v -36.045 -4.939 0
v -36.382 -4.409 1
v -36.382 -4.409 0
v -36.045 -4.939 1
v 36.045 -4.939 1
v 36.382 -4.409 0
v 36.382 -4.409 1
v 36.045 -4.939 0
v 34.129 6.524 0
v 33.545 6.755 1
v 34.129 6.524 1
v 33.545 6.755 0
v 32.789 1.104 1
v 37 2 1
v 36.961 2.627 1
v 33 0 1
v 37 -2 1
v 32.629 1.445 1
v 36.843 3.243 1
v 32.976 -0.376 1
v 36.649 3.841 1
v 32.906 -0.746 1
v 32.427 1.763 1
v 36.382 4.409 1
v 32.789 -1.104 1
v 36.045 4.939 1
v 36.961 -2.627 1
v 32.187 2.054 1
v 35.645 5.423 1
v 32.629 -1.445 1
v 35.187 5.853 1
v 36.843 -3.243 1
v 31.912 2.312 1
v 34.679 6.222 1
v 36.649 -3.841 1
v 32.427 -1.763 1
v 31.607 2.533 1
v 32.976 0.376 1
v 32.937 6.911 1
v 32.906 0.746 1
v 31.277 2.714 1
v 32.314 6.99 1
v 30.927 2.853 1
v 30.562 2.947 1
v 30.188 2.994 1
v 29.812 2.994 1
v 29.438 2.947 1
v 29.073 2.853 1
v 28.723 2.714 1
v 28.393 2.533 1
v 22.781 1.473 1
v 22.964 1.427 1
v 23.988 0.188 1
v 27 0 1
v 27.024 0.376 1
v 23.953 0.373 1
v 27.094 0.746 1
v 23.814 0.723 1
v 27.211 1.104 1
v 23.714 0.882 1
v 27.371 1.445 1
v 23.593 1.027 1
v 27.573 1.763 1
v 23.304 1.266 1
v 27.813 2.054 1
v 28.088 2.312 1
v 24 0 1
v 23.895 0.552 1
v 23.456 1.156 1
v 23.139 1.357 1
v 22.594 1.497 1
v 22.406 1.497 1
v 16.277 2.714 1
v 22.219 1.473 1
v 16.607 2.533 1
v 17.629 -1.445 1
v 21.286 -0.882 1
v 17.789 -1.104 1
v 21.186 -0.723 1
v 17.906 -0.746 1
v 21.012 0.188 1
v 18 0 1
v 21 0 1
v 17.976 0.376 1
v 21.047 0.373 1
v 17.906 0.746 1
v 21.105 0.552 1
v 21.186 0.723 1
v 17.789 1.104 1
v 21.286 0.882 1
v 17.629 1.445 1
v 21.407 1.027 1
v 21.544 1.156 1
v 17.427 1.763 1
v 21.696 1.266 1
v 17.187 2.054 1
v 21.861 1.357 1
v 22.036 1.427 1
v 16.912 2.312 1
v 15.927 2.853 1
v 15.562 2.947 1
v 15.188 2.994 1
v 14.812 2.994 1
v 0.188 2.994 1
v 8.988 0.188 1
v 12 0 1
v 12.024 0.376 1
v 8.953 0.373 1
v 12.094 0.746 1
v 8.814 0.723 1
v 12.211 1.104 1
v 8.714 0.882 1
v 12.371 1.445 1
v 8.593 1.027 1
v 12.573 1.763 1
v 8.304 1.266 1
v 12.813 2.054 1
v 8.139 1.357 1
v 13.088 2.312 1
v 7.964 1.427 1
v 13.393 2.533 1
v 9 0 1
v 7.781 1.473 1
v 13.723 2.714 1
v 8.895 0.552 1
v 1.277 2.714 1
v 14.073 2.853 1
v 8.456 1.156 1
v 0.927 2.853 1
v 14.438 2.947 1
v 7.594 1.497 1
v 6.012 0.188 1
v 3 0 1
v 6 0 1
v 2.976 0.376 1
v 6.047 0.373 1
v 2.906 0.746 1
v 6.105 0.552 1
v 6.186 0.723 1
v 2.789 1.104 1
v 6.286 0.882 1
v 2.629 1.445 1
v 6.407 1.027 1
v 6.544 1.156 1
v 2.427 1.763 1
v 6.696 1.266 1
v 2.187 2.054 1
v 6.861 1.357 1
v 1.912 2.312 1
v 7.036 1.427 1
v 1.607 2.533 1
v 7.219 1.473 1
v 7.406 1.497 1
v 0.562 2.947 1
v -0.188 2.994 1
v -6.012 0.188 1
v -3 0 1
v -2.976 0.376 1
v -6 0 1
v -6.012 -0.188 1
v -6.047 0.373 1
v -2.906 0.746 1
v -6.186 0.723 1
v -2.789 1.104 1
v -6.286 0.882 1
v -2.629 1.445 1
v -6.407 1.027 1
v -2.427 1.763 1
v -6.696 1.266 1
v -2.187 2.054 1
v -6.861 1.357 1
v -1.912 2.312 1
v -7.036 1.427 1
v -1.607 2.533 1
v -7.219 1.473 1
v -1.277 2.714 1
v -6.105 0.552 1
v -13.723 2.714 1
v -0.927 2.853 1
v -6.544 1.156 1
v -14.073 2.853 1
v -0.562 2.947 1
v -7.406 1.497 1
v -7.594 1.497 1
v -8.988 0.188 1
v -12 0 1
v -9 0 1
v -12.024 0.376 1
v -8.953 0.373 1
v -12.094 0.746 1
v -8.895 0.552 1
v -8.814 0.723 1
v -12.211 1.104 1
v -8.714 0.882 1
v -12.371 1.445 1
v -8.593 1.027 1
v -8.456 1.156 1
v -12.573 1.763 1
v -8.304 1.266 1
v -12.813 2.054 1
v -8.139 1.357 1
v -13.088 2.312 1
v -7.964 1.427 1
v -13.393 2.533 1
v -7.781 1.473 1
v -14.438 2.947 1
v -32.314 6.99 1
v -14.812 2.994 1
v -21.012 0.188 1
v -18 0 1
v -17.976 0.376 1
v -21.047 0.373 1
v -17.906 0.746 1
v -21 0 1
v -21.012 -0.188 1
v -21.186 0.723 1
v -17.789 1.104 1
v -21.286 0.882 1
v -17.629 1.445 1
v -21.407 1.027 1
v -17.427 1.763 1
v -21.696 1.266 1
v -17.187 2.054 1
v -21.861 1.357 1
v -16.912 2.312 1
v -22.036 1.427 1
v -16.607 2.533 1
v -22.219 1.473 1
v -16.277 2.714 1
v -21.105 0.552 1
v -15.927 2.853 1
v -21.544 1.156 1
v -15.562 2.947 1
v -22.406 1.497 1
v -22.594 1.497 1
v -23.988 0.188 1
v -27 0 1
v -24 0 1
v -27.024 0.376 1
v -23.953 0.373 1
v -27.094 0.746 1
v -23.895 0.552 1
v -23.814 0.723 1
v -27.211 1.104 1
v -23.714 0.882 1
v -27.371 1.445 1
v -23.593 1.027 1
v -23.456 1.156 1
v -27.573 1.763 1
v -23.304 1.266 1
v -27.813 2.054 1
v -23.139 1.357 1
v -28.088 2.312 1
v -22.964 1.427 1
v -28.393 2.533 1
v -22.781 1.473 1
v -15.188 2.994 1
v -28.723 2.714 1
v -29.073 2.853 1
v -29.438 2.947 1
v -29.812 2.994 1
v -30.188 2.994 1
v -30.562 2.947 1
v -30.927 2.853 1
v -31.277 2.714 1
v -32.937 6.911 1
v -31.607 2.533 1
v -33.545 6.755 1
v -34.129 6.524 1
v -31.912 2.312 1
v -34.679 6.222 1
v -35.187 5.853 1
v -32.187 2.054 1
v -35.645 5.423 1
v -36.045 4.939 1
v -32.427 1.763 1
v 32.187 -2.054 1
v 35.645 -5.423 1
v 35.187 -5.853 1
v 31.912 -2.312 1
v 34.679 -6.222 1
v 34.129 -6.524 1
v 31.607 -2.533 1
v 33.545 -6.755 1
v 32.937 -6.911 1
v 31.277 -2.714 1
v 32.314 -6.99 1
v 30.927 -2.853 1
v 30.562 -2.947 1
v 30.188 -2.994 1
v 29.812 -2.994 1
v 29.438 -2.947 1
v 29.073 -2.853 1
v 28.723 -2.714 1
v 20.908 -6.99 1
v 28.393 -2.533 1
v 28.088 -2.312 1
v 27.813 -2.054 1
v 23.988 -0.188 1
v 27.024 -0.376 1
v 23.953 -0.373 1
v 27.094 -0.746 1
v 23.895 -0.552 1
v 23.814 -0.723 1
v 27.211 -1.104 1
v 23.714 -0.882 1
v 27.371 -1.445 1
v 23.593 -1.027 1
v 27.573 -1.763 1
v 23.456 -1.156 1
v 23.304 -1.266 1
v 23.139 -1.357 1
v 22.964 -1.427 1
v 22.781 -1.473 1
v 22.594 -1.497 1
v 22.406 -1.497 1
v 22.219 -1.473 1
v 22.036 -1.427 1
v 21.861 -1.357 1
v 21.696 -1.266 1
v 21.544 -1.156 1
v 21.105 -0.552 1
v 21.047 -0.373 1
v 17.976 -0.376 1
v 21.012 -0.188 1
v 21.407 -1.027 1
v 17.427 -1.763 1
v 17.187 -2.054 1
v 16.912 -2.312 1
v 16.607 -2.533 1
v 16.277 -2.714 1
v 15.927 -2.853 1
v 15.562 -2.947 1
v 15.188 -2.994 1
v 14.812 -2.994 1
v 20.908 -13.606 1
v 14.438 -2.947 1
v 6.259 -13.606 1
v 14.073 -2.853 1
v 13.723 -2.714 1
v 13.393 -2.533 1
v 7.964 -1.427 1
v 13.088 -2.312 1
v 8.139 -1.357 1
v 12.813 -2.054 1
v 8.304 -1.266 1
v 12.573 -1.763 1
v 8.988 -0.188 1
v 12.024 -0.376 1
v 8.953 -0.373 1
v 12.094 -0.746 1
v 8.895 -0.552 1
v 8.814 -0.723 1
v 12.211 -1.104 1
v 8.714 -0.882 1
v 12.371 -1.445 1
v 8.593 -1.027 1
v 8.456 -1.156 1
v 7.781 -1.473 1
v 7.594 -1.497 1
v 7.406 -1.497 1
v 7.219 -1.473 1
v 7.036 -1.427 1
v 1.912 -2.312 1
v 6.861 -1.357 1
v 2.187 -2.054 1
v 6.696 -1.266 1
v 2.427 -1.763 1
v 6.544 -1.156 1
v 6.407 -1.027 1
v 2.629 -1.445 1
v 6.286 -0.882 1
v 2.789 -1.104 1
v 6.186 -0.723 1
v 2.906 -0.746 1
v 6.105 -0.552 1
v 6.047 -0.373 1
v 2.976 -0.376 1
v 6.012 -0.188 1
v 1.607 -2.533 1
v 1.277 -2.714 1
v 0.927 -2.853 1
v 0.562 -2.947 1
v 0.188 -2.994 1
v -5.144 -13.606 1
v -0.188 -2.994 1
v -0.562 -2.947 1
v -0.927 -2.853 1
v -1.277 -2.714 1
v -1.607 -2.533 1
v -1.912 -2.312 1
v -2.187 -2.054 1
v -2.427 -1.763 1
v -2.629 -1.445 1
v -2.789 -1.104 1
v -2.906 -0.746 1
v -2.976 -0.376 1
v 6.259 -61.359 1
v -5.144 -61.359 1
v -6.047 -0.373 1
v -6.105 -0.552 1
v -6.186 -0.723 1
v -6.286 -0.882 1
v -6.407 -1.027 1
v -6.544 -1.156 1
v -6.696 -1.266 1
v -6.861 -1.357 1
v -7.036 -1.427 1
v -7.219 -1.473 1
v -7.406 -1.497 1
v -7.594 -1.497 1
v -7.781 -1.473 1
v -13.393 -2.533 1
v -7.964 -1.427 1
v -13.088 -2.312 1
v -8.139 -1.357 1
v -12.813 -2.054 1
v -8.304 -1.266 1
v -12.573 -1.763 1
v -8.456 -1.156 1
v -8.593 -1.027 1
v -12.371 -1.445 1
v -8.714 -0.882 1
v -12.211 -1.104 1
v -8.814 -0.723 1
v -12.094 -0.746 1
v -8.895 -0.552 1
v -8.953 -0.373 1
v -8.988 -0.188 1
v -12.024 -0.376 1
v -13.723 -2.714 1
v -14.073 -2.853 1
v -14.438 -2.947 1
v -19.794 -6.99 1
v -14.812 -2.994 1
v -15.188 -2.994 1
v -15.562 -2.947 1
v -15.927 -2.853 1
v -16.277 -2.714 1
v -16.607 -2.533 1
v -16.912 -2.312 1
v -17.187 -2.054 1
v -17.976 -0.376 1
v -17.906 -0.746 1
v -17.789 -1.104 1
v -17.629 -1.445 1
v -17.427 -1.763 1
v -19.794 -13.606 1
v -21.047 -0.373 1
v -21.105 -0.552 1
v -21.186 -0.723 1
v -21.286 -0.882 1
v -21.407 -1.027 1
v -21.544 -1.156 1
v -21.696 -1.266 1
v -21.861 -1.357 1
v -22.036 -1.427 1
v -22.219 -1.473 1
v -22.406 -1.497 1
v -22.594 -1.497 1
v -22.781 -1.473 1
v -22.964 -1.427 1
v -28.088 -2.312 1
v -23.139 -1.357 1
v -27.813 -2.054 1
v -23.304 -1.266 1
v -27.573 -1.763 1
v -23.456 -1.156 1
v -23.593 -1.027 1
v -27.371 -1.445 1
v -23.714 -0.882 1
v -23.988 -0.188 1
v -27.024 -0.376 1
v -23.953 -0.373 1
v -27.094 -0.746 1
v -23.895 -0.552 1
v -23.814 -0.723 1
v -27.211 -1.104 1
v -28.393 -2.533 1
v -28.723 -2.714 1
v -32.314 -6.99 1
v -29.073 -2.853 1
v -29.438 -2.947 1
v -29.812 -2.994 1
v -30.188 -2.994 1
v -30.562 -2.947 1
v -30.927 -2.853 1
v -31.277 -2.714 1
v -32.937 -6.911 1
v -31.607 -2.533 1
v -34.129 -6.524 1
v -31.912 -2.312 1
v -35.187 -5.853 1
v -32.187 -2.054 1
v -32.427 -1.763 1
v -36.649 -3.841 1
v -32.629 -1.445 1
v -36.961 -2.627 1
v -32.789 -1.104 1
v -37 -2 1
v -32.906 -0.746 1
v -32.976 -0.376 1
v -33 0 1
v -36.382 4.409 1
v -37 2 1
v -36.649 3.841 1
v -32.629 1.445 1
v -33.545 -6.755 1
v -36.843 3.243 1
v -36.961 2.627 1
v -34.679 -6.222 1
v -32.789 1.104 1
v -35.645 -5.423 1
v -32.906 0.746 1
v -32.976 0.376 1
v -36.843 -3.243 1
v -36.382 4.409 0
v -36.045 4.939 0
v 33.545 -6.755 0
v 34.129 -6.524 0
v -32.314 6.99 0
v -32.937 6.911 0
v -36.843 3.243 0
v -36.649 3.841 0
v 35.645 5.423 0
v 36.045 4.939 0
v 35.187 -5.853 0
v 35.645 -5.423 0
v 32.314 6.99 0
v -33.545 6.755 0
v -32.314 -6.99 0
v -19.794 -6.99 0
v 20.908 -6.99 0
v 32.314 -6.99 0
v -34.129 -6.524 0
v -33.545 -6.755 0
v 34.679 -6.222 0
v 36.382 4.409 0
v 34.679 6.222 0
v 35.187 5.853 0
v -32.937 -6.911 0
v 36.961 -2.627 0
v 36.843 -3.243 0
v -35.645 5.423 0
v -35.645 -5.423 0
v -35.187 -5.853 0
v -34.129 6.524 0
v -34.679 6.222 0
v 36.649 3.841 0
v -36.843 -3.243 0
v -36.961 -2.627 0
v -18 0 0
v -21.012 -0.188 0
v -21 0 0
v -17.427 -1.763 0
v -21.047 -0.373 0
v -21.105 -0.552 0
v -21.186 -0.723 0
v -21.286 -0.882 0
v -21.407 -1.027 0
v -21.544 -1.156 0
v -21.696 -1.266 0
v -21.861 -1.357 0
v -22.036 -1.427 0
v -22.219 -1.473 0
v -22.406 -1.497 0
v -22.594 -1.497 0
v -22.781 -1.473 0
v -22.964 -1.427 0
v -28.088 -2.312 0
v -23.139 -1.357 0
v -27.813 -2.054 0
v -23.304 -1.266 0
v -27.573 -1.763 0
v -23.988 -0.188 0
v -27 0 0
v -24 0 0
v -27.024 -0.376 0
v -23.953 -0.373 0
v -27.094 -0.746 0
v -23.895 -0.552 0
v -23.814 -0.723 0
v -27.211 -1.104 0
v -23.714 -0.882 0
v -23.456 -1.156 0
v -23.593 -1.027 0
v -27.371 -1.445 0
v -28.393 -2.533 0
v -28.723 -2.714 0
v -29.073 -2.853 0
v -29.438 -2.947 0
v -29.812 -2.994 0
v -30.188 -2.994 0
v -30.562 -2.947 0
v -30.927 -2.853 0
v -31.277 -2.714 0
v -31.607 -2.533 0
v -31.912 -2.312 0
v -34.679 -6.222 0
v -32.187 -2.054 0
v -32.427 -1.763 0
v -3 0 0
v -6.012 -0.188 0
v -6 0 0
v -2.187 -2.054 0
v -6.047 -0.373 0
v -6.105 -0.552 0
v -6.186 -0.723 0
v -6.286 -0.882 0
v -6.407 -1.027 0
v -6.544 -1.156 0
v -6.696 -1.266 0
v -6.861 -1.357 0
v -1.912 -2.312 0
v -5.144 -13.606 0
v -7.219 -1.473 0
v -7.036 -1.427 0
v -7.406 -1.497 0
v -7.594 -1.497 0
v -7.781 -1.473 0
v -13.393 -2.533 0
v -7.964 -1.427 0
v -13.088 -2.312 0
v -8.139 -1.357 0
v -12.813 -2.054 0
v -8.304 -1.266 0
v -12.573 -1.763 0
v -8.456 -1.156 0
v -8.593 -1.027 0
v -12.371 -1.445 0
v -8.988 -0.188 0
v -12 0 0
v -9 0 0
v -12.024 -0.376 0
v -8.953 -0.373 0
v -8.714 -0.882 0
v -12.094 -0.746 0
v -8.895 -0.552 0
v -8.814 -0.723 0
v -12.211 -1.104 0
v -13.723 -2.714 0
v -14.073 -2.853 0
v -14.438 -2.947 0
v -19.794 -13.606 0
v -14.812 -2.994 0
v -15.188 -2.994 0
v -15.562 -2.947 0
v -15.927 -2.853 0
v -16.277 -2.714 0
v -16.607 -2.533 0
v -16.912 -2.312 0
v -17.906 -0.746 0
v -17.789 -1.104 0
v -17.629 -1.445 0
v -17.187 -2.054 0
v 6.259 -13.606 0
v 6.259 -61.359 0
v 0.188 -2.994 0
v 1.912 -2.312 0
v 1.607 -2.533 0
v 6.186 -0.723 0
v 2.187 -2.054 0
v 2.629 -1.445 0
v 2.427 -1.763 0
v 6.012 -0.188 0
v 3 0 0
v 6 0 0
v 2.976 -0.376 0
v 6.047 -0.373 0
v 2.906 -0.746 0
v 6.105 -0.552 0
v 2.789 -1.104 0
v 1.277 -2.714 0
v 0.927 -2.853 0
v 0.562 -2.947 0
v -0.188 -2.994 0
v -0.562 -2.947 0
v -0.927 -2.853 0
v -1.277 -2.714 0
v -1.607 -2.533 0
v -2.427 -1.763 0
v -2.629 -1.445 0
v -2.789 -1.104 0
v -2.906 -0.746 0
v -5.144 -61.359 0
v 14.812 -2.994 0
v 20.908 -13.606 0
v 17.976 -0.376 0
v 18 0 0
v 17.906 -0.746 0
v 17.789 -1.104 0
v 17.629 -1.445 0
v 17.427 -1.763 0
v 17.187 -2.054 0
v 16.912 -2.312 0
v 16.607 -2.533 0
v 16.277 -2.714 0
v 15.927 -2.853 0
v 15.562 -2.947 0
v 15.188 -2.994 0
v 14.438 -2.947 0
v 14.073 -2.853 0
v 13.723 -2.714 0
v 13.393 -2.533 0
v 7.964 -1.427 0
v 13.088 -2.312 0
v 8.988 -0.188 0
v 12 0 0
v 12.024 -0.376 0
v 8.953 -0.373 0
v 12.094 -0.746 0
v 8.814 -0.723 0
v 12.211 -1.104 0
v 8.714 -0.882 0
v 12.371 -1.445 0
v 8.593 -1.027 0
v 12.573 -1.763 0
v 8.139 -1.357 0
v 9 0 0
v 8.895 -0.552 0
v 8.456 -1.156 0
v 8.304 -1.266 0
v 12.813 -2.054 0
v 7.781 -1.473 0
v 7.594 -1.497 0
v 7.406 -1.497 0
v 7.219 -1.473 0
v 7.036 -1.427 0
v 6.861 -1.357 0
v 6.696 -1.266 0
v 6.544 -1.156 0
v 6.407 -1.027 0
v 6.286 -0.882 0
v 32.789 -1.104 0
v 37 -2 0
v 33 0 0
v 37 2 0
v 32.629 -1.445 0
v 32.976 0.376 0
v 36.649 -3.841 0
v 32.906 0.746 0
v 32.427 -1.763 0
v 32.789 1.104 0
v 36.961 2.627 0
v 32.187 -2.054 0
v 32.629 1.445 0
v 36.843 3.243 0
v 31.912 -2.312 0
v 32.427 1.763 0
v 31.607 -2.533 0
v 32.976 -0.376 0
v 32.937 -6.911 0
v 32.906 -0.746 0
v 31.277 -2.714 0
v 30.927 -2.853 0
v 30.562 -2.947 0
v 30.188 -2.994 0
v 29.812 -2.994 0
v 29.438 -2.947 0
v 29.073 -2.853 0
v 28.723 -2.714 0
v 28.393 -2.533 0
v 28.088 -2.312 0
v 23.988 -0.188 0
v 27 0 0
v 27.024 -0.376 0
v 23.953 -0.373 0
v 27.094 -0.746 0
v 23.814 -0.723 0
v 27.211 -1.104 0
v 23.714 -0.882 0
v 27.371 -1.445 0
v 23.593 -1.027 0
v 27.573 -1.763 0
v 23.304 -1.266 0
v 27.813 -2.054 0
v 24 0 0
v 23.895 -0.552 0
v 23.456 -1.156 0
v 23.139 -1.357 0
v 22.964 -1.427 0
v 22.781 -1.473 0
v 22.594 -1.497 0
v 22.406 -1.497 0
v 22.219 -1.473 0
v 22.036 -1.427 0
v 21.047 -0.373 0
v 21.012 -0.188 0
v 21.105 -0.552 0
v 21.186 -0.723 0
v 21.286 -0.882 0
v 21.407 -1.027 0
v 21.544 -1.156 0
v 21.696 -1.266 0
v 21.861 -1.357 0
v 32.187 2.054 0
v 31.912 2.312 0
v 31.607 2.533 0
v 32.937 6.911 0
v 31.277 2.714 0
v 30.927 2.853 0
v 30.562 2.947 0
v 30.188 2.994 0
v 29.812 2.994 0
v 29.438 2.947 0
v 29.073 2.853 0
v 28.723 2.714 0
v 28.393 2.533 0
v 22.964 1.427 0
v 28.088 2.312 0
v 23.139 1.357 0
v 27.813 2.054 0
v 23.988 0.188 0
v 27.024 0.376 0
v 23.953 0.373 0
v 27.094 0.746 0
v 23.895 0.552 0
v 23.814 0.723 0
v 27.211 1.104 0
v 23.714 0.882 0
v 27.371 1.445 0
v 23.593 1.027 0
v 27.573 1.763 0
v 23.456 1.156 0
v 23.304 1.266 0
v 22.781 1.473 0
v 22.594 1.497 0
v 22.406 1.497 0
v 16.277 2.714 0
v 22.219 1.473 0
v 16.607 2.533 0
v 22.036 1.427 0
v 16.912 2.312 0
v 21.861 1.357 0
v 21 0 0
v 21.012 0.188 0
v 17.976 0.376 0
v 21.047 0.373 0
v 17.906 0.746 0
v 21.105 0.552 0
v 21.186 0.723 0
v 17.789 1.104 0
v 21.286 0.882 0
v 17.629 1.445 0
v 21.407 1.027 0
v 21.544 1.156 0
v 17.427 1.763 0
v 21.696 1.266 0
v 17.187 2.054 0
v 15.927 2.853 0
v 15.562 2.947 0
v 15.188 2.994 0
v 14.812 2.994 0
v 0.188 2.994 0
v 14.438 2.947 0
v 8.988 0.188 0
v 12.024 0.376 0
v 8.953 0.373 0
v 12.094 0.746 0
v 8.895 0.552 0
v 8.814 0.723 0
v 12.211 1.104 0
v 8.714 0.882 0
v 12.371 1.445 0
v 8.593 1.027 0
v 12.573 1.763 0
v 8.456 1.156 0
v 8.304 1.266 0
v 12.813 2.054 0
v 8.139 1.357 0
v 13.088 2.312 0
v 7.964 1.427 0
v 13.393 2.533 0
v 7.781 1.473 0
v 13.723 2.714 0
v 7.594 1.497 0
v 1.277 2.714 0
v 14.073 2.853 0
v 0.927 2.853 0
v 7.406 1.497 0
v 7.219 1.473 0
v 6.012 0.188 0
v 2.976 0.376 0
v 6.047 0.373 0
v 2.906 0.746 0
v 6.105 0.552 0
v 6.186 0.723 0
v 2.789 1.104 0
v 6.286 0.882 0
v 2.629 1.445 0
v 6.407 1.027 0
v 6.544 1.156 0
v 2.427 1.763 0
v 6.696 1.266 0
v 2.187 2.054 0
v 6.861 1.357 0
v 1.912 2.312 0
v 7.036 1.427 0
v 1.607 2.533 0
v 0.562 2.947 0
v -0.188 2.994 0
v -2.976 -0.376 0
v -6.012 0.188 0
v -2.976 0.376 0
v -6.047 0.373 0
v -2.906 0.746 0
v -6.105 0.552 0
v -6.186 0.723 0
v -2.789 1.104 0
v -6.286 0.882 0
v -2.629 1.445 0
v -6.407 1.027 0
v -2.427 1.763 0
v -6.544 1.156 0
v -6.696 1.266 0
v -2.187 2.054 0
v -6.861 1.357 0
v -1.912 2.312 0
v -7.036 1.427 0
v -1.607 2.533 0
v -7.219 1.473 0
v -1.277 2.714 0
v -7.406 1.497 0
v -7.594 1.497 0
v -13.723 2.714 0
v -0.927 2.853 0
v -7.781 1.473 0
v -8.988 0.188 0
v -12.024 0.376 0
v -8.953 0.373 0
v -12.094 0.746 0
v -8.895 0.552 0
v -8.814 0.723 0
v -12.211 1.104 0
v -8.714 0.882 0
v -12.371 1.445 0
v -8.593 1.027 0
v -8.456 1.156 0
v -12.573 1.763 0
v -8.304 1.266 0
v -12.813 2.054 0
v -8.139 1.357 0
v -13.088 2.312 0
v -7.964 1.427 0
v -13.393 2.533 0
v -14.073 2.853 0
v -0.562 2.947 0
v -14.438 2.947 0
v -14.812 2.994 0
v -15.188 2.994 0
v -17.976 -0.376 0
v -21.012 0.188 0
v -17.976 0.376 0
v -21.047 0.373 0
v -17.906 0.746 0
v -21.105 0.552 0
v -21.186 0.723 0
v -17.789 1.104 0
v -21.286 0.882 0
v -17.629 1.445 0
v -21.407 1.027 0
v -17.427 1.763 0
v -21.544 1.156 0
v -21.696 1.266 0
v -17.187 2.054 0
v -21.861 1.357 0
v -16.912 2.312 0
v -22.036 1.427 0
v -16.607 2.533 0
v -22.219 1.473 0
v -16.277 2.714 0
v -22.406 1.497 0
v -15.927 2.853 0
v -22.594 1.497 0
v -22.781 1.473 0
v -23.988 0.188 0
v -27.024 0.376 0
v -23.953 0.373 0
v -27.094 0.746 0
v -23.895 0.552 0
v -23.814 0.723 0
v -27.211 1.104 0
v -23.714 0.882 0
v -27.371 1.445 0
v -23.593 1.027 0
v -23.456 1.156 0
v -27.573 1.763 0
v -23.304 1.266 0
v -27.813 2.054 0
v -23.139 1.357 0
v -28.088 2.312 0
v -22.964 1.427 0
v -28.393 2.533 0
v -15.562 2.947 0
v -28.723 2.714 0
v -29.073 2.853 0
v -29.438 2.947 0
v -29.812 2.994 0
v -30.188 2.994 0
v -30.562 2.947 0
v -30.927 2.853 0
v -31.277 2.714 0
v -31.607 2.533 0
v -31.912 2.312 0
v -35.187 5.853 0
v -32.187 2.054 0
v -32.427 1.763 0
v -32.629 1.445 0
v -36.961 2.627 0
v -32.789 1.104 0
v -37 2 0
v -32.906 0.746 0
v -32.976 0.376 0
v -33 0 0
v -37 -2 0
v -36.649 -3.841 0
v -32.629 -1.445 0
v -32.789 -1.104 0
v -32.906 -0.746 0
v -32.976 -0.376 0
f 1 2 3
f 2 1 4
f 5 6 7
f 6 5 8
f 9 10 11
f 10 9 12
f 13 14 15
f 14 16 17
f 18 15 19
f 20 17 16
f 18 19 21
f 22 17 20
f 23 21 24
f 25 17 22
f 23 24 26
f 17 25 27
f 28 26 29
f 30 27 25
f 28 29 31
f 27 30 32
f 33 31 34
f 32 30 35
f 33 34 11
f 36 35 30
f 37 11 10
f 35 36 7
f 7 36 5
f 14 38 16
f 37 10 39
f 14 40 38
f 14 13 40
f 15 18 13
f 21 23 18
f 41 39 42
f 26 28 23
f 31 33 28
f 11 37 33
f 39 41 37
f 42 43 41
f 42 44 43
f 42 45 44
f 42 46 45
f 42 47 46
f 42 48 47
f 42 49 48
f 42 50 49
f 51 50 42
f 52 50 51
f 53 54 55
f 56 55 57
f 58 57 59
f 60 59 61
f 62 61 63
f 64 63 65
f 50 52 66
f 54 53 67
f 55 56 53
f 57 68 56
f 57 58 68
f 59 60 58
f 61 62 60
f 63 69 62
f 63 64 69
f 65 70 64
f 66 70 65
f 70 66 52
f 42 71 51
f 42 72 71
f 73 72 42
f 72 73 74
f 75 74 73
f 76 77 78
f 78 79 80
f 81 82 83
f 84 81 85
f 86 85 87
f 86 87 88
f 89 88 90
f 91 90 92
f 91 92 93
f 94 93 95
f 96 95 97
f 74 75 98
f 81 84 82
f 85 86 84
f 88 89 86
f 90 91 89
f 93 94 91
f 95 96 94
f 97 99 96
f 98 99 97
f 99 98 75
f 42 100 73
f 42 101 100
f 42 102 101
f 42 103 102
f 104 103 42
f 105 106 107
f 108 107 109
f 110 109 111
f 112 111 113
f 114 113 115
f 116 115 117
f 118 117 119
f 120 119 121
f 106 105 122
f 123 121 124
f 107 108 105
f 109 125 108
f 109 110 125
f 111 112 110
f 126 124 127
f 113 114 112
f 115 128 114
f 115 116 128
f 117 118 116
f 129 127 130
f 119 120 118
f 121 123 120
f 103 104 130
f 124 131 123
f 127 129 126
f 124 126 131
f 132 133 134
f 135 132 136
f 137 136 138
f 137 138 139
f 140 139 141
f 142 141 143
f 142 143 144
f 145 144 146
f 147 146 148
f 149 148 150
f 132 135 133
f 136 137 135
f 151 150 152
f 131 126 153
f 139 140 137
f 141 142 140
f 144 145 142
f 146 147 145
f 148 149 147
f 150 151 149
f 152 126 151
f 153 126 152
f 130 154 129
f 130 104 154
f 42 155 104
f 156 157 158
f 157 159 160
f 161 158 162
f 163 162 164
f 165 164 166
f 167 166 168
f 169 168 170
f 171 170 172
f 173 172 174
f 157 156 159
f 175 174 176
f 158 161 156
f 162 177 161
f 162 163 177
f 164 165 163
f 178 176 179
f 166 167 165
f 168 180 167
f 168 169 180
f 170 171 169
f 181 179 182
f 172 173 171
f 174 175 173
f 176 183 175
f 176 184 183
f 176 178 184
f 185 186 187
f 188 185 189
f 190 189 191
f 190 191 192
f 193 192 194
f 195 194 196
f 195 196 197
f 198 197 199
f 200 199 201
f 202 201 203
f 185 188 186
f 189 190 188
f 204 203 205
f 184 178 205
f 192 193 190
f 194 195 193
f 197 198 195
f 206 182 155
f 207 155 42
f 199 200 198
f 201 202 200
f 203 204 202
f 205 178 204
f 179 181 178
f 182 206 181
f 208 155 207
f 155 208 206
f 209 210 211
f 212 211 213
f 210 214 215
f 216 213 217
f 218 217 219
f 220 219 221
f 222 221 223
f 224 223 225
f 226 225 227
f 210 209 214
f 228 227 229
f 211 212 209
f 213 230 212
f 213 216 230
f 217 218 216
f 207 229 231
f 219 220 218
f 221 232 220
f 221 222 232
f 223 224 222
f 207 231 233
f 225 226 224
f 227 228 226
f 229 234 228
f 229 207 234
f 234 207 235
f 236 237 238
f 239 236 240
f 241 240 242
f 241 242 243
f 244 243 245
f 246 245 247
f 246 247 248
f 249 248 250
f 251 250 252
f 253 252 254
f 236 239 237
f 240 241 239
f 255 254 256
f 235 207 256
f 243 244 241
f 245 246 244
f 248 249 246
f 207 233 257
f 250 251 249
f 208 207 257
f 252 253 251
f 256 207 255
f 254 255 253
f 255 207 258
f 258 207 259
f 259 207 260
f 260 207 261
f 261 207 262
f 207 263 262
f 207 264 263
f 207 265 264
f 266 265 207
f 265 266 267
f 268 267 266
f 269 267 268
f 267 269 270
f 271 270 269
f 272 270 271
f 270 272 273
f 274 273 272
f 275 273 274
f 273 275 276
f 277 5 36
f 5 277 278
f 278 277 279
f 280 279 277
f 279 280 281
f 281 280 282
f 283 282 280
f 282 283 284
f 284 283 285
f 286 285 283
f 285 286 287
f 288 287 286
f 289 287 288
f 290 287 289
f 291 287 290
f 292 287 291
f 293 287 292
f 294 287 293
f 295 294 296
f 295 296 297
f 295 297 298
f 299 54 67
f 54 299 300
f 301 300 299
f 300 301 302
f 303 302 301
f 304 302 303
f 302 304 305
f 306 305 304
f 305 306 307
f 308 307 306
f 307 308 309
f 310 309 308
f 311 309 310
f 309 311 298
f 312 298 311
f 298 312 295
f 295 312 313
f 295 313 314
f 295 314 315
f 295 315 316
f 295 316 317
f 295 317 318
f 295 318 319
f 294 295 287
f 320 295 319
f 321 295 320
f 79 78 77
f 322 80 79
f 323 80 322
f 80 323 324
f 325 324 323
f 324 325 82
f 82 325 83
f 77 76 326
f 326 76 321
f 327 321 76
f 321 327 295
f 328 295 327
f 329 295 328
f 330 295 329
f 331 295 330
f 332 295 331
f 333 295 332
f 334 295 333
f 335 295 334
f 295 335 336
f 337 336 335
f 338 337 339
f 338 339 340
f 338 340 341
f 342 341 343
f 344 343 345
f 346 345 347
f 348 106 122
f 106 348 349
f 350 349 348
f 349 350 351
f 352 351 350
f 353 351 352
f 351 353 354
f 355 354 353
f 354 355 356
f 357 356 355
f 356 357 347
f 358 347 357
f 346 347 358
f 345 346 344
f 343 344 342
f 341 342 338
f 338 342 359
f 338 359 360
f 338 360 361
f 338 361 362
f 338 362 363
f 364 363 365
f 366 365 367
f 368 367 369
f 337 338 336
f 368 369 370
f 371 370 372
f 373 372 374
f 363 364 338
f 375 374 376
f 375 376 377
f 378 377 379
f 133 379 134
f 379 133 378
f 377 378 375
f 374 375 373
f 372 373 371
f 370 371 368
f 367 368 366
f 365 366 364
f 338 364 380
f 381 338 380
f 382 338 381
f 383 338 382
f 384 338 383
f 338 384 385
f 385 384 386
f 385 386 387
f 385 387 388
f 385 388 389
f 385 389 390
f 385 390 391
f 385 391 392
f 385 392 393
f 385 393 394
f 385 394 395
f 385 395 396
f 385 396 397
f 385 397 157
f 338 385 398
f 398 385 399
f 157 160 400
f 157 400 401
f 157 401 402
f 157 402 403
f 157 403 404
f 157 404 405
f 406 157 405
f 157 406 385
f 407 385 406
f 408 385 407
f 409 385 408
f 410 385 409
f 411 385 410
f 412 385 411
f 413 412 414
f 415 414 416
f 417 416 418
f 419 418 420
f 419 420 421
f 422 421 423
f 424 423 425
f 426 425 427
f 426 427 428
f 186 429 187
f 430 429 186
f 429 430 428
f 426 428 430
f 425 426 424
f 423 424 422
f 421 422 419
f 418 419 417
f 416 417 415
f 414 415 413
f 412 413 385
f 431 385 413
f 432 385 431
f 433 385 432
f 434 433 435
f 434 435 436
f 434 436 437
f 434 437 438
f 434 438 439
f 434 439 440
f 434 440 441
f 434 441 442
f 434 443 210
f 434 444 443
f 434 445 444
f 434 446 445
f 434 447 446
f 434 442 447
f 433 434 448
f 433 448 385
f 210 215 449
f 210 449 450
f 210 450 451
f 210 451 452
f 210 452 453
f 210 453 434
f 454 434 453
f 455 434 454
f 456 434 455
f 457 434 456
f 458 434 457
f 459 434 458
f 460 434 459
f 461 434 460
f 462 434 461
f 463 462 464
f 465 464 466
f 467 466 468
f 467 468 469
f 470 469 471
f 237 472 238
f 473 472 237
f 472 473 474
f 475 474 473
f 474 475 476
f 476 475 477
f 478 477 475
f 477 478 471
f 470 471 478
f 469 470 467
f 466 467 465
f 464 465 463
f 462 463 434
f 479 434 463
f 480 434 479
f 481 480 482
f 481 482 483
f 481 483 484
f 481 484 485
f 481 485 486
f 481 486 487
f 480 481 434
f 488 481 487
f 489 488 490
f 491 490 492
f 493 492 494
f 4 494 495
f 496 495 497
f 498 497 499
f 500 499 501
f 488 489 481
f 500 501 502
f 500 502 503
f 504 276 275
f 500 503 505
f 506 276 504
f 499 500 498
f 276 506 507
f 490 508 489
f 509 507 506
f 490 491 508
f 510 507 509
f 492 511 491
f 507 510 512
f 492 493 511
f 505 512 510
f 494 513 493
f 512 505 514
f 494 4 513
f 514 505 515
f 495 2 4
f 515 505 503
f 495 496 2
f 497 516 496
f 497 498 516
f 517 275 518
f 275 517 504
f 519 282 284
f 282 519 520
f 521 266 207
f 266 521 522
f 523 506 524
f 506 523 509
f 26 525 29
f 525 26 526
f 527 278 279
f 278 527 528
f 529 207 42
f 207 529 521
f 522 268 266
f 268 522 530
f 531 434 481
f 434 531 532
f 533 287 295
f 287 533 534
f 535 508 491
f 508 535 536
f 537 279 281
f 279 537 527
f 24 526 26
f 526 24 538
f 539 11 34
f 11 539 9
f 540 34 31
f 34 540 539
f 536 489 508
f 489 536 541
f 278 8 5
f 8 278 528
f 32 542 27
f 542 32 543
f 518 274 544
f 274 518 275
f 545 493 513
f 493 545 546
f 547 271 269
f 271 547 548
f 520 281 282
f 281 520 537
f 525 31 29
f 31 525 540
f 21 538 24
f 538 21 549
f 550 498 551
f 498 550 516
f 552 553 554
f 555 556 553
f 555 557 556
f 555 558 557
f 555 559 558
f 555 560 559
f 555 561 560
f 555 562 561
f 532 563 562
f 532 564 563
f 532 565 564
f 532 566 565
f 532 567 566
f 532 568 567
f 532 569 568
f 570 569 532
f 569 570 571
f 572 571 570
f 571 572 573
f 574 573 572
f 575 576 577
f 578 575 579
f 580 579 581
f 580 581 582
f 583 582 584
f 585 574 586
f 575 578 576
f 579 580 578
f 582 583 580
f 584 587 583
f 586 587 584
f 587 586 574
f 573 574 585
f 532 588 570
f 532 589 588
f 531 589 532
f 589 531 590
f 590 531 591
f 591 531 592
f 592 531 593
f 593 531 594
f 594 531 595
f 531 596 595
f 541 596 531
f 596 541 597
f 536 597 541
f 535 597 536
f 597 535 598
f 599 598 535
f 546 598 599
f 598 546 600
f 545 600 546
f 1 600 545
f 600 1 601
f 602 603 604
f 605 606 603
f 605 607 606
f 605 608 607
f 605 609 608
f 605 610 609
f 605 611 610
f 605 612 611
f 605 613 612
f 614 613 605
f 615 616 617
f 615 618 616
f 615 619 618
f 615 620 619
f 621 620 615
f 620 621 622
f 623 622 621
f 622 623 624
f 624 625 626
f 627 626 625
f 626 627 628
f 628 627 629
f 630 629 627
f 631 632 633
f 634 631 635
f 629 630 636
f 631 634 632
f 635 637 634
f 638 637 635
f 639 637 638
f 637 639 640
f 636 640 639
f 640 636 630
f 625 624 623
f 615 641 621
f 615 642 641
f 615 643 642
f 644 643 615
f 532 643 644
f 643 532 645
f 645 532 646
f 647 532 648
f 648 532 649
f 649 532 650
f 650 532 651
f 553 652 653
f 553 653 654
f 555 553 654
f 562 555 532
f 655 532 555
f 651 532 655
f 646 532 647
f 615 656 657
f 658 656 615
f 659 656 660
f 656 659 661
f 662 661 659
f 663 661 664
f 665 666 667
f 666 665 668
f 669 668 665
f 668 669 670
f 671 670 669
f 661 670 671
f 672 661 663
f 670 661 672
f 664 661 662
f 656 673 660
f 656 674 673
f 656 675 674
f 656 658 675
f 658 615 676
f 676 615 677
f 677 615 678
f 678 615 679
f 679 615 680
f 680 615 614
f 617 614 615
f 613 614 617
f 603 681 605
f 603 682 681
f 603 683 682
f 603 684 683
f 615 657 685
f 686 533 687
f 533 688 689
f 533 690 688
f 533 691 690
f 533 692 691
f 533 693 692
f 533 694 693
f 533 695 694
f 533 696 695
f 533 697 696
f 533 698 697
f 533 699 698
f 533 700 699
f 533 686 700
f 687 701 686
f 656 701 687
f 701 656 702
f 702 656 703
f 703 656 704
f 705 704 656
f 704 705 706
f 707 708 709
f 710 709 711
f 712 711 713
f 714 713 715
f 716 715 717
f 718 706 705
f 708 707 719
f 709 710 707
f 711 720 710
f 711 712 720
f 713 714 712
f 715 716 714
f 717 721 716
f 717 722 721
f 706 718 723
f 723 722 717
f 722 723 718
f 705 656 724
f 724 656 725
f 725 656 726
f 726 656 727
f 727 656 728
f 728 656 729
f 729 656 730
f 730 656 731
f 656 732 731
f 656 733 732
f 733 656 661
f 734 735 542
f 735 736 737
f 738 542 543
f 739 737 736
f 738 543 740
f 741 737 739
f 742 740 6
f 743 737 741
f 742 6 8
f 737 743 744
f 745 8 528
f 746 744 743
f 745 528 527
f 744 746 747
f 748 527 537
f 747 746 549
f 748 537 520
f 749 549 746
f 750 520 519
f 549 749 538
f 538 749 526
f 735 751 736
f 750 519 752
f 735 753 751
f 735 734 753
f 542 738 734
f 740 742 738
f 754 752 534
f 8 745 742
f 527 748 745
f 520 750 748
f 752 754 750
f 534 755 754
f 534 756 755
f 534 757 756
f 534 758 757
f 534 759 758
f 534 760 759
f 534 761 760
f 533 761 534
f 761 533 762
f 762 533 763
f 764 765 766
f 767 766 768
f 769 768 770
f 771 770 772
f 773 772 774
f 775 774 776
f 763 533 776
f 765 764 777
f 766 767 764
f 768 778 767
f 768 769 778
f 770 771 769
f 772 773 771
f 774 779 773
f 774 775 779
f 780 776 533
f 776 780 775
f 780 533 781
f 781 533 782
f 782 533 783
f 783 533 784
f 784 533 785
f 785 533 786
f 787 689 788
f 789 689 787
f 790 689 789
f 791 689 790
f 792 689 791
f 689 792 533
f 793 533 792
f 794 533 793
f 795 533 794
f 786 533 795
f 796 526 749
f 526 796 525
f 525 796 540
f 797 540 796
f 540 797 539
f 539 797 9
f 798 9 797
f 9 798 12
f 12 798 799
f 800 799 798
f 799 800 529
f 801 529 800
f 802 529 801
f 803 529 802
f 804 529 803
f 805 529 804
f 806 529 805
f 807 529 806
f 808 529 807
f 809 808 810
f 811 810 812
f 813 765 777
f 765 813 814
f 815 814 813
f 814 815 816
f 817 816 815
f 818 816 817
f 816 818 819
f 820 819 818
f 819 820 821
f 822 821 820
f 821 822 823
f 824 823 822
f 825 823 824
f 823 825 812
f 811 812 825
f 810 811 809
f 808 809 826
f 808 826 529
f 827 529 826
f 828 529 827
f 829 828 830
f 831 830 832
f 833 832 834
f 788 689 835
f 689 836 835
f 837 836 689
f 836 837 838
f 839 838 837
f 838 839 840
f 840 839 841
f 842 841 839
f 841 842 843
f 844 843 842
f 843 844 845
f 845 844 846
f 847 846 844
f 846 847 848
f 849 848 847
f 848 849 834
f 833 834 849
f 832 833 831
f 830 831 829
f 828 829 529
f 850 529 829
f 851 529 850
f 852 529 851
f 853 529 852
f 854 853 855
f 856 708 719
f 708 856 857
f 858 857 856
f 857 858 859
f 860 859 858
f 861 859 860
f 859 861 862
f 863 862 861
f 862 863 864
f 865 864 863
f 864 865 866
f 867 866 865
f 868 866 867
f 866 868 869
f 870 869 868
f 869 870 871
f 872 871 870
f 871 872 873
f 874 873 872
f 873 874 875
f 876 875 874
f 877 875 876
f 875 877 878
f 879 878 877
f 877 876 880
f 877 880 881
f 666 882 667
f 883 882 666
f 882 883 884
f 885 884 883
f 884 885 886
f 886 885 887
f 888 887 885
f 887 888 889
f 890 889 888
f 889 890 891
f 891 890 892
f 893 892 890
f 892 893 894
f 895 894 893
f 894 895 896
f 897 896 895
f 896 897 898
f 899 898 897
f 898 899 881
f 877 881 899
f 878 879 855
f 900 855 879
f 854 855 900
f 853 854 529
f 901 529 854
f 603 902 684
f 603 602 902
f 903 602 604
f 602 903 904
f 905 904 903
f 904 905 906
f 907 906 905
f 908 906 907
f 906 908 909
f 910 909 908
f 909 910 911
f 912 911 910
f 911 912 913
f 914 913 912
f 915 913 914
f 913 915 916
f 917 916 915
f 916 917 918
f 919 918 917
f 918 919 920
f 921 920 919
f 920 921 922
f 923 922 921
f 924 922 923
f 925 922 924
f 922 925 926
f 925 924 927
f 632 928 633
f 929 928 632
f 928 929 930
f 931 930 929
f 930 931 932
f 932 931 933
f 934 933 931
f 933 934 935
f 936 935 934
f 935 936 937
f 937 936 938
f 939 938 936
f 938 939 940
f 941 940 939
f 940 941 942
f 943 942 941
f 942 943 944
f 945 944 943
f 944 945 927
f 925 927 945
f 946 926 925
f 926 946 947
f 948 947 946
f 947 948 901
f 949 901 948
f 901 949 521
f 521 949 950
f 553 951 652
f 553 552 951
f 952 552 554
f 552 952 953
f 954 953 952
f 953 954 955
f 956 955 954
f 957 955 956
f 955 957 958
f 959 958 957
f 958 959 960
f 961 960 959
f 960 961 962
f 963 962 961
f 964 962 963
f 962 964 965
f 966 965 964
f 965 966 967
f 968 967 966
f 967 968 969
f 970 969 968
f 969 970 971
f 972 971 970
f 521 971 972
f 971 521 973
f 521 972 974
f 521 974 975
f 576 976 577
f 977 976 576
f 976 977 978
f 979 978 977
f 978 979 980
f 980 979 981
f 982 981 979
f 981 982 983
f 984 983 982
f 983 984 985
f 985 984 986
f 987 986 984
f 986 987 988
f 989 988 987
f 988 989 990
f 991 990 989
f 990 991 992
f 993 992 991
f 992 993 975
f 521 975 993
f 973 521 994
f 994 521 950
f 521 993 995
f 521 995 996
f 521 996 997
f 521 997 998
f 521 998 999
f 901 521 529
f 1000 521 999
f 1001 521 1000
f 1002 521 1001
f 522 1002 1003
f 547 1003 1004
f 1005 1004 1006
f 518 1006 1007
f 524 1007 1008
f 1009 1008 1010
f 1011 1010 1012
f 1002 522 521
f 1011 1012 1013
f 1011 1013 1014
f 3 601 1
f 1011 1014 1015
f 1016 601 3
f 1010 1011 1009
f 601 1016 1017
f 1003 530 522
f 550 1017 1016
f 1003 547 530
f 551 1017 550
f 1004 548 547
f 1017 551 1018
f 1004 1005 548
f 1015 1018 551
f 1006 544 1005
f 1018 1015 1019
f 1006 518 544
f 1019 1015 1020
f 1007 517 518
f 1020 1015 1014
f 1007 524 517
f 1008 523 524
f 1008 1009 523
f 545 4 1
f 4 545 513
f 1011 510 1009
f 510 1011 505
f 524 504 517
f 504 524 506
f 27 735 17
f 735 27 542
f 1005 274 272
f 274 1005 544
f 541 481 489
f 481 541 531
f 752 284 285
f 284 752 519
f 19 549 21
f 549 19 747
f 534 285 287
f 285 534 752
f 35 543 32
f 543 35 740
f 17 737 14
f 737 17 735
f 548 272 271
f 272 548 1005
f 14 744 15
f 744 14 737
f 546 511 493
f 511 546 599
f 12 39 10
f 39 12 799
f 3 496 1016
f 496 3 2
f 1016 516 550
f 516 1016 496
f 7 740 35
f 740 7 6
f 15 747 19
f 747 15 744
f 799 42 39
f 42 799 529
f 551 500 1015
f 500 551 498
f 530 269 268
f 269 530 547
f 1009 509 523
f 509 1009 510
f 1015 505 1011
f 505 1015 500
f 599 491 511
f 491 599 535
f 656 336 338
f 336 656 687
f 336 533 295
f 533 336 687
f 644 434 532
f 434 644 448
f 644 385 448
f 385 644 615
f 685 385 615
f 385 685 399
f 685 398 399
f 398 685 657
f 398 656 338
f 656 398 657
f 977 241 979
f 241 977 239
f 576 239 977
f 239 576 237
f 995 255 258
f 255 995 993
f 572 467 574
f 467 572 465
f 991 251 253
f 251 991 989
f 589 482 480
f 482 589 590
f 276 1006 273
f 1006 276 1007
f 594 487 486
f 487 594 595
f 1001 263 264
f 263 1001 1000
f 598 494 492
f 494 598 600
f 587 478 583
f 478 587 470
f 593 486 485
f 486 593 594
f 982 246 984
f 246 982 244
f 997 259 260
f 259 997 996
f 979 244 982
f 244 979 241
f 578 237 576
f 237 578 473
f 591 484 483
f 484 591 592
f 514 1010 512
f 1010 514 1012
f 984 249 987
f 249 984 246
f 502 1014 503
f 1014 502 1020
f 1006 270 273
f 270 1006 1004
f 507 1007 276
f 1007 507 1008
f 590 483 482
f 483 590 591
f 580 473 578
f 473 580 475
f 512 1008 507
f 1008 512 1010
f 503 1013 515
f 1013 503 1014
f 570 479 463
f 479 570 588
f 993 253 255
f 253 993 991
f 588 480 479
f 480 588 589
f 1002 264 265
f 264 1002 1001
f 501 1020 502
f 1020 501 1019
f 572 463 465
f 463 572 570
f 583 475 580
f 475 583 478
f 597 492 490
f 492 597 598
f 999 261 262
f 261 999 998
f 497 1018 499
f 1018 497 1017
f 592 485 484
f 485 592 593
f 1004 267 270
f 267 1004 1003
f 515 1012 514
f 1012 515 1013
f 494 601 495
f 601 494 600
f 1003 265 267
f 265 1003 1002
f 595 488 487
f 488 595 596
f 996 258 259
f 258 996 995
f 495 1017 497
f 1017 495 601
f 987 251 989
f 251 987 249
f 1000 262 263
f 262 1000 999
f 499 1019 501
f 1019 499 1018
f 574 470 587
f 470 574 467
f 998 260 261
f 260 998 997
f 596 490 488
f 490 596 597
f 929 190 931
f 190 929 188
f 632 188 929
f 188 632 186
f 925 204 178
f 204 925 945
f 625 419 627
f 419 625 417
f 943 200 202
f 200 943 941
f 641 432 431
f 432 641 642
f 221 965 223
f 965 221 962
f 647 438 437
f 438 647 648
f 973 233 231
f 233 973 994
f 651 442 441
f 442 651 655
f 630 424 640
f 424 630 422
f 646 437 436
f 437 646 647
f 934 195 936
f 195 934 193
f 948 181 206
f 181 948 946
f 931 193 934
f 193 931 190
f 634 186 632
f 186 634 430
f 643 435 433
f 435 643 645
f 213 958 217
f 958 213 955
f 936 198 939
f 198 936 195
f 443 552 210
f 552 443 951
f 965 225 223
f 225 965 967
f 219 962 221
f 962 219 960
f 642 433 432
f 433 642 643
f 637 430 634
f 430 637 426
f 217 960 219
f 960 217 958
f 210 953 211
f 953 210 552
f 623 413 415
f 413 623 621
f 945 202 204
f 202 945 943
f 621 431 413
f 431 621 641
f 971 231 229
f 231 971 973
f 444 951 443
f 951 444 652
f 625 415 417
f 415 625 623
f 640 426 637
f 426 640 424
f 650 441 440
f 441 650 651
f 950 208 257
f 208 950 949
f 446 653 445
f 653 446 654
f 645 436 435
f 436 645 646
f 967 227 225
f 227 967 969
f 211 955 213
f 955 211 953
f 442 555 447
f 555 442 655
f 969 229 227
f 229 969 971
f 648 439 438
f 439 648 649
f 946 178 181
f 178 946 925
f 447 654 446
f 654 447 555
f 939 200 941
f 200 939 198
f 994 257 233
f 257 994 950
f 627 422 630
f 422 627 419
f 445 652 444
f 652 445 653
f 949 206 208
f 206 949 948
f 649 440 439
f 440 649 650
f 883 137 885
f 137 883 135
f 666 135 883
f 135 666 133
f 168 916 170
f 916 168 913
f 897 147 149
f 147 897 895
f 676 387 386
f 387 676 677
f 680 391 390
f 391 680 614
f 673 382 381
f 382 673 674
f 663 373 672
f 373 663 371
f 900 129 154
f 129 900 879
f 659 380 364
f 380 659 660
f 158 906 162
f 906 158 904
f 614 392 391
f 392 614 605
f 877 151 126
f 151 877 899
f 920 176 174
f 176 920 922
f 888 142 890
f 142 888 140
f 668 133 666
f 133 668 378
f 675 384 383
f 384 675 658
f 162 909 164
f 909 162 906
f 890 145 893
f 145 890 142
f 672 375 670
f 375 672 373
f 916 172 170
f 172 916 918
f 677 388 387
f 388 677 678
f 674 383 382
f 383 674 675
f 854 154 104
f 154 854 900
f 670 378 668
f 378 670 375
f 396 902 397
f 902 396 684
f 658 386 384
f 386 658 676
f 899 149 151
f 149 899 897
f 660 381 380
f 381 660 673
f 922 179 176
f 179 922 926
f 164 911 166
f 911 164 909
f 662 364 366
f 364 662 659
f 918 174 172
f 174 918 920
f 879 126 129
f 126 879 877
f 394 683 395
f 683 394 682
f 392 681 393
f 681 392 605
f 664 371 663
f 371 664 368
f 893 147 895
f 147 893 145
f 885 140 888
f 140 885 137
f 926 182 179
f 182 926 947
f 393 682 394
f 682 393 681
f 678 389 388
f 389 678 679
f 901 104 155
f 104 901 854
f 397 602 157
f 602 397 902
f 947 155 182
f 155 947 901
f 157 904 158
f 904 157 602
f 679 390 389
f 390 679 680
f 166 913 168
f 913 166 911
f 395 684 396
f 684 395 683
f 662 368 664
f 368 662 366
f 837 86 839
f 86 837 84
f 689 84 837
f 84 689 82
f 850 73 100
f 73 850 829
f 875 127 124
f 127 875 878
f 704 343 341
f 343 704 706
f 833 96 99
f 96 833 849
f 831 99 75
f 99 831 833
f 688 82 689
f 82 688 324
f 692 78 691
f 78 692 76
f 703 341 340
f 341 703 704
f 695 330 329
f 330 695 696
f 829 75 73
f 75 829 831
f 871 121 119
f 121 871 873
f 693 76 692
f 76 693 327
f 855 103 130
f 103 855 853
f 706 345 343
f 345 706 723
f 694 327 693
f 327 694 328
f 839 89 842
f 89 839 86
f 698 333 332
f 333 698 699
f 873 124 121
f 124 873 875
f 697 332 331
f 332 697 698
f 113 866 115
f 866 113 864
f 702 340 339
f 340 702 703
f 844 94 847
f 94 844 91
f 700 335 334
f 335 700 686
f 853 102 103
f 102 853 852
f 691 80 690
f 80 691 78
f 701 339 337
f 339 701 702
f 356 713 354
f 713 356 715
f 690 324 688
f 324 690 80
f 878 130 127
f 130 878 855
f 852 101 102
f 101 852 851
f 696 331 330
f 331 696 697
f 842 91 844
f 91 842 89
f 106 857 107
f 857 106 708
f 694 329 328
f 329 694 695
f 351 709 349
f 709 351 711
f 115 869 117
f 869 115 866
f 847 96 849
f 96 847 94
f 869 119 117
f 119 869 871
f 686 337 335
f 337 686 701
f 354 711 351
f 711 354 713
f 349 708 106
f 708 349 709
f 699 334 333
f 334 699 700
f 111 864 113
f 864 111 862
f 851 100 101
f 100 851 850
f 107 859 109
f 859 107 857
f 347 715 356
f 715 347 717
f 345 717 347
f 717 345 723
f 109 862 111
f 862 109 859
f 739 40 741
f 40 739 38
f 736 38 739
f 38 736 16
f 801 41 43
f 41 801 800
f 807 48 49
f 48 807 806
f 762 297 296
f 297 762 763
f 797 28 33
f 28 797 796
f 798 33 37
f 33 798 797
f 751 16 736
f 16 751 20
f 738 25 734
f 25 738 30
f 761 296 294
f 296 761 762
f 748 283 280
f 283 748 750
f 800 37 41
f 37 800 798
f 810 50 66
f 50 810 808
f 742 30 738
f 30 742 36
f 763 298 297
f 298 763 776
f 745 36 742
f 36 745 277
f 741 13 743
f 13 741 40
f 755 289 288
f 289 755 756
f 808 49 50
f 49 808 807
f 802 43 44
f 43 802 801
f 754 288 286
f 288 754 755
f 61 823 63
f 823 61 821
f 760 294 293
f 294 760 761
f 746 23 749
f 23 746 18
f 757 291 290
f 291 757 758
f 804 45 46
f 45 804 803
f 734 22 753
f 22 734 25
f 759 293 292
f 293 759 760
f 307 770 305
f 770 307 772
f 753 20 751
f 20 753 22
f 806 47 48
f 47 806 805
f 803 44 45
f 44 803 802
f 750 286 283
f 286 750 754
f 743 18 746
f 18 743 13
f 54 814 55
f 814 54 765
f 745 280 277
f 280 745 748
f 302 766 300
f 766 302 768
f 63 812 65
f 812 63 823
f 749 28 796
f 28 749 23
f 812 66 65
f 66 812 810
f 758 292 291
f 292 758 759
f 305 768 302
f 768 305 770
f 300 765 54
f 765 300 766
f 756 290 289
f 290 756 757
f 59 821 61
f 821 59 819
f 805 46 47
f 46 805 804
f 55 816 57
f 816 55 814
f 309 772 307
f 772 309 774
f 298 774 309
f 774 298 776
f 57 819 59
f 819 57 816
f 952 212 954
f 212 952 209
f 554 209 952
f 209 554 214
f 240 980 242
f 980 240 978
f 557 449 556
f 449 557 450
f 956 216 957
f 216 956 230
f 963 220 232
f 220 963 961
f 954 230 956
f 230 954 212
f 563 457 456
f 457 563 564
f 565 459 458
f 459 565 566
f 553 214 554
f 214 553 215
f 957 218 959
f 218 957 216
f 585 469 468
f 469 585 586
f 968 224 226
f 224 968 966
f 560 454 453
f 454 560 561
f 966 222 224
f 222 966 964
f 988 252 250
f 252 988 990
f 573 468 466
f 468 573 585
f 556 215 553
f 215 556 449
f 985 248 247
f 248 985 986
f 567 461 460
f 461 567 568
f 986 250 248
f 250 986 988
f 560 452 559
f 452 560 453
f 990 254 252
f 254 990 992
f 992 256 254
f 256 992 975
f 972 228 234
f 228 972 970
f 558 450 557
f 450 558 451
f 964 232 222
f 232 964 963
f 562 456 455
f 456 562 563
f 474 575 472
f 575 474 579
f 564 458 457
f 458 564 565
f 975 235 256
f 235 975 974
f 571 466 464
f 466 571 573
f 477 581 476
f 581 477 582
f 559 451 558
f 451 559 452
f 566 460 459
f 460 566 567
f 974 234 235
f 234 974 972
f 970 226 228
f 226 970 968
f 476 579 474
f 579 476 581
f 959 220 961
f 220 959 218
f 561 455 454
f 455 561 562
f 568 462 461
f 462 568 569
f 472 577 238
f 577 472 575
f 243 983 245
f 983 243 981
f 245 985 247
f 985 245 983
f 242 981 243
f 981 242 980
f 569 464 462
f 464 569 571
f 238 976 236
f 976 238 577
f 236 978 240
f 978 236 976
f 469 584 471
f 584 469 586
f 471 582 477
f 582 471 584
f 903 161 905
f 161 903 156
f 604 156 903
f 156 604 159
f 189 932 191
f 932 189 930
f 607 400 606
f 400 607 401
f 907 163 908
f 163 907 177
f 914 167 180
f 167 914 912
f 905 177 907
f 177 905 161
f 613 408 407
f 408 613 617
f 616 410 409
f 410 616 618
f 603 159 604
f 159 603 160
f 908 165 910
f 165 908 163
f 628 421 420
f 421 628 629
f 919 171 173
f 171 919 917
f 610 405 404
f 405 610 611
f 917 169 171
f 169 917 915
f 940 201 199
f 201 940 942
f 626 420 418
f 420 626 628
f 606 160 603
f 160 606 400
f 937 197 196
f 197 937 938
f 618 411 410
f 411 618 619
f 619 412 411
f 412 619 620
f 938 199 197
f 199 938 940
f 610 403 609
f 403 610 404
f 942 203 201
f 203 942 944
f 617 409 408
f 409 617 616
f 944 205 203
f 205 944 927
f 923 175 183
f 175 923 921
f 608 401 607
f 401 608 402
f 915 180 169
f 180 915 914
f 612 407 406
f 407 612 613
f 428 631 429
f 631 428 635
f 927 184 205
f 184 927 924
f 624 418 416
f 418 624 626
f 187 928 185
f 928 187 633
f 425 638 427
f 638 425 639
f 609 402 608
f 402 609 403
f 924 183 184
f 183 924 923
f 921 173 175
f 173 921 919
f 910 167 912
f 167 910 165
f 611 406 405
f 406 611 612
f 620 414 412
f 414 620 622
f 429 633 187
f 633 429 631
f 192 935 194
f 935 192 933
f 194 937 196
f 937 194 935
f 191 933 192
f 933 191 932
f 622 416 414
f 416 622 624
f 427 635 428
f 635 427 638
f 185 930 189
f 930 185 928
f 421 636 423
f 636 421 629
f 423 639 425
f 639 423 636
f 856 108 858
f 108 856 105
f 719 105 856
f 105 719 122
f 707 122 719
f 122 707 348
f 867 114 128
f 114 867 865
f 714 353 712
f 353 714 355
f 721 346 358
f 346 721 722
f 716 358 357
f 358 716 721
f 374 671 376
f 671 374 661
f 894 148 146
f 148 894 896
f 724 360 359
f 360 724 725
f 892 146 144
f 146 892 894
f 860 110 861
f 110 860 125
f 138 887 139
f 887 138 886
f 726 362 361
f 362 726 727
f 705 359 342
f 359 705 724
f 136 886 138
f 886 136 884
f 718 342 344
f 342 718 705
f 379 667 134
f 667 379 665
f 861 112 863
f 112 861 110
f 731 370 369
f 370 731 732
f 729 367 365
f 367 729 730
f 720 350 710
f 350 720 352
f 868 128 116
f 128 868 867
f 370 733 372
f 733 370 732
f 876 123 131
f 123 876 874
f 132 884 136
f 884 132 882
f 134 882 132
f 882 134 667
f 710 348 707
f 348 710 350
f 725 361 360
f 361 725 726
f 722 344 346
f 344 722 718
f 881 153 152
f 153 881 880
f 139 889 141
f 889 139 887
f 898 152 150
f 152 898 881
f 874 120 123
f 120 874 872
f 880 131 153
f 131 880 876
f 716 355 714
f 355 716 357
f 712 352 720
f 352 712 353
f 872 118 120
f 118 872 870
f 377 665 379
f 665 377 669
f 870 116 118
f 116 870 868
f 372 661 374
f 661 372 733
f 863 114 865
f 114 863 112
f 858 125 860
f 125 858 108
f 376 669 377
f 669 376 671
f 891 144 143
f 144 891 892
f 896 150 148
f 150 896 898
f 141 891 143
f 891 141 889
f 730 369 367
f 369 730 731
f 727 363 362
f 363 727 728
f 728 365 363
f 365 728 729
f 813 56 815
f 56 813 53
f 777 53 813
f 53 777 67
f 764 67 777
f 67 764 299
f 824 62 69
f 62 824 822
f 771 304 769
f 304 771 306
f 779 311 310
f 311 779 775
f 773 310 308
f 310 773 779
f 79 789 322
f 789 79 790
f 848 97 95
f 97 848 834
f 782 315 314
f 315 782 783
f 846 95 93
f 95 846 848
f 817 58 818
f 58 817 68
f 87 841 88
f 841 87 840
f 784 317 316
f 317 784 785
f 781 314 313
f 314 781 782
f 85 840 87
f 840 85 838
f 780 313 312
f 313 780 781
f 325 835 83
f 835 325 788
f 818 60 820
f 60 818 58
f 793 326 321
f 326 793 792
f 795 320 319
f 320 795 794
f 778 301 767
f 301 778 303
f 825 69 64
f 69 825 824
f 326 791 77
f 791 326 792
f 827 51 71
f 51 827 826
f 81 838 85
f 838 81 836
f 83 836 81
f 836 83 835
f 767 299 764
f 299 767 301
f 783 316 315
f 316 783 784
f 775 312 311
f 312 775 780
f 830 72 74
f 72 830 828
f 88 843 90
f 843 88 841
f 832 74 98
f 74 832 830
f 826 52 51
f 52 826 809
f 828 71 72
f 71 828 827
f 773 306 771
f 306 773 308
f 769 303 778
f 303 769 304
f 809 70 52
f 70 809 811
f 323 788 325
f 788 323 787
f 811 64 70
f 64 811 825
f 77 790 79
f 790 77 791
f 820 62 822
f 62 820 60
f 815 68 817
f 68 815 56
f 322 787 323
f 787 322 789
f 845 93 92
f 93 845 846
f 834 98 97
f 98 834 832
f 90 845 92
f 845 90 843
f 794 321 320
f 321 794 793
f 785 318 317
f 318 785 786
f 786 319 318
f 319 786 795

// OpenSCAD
$fn = 50;


difference() {
	union() {
		hull() {
			translate(v = [-32.0000000000, 2.0000000000, 0]) {
				cylinder(h = 1, r = 5);
			}
			translate(v = [32.0000000000, 2.0000000000, 0]) {
				cylinder(h = 1, r = 5);
			}
			translate(v = [-32.0000000000, -2.0000000000, 0]) {
				cylinder(h = 1, r = 5);
			}
			translate(v = [32.0000000000, -2.0000000000, 0]) {
				cylinder(h = 1, r = 5);
			}
		}
		translate(v = [0, -5, 0]) {
			linear_extrude(height = 1) {
				text(font = "DejaVu Sans Mono:style=Bold", halign = "center", size = 57.0000000000, text = "T", valign = "top");
			}
		}
	}
	union() {
		translate(v = [-30.0000000000, 0.0000000000, 0]) {
			translate(v = [0, 0, -100]) {
				cylinder(h = 200, r = 3.0000000000);
			}
		}
		translate(v = [-15.0000000000, 0.0000000000, 0]) {
			translate(v = [0, 0, -100]) {
				cylinder(h = 200, r = 3.0000000000);
			}
		}
		translate(v = [0, 0, -100]) {
			cylinder(h = 200, r = 3.0000000000);
		}
		translate(v = [15.0000000000, 0.0000000000, 0]) {
			translate(v = [0, 0, -100]) {
				cylinder(h = 200, r = 3.0000000000);
			}
		}
		translate(v = [30.0000000000, 0.0000000000, 0]) {
			translate(v = [0, 0, -100]) {
				cylinder(h = 200, r = 3.0000000000);
			}
		}
		translate(v = [-30.0000000000, 0.0000000000, 0]) {
			translate(v = [0, 0, -100]) {
				cylinder(h = 200, r = 1.5000000000);
			}
		}
		translate(v = [-22.5000000000, 0.0000000000, 0]) {
			translate(v = [0, 0, -100]) {
				cylinder(h = 200, r = 1.5000000000);
			}
		}
		translate(v = [-15.0000000000, 0.0000000000, 0]) {
			translate(v = [0, 0, -100]) {
				cylinder(h = 200, r = 1.5000000000);
			}
		}
		translate(v = [-7.5000000000, 0.0000000000, 0]) {
			translate(v = [0, 0, -100]) {
				cylinder(h = 200, r = 1.5000000000);
			}
		}
		translate(v = [0, 0, -100]) {
			cylinder(h = 200, r = 1.5000000000);
		}
		translate(v = [7.5000000000, 0.0000000000, 0]) {
			translate(v = [0, 0, -100]) {
				cylinder(h = 200, r = 1.5000000000);
			}
		}
		translate(v = [15.0000000000, 0.0000000000, 0]) {
			translate(v = [0, 0, -100]) {
				cylinder(h = 200, r = 1.5000000000);
			}
		}
		translate(v = [22.5000000000, 0.0000000000, 0]) {
			translate(v = [0, 0, -100]) {
				cylinder(h = 200, r = 1.5000000000);
			}
		}
		translate(v = [30.0000000000, 0.0000000000, 0]) {
			translate(v = [0, 0, -100]) {
				cylinder(h = 200, r = 1.5000000000);
			}
		}
	}
}
